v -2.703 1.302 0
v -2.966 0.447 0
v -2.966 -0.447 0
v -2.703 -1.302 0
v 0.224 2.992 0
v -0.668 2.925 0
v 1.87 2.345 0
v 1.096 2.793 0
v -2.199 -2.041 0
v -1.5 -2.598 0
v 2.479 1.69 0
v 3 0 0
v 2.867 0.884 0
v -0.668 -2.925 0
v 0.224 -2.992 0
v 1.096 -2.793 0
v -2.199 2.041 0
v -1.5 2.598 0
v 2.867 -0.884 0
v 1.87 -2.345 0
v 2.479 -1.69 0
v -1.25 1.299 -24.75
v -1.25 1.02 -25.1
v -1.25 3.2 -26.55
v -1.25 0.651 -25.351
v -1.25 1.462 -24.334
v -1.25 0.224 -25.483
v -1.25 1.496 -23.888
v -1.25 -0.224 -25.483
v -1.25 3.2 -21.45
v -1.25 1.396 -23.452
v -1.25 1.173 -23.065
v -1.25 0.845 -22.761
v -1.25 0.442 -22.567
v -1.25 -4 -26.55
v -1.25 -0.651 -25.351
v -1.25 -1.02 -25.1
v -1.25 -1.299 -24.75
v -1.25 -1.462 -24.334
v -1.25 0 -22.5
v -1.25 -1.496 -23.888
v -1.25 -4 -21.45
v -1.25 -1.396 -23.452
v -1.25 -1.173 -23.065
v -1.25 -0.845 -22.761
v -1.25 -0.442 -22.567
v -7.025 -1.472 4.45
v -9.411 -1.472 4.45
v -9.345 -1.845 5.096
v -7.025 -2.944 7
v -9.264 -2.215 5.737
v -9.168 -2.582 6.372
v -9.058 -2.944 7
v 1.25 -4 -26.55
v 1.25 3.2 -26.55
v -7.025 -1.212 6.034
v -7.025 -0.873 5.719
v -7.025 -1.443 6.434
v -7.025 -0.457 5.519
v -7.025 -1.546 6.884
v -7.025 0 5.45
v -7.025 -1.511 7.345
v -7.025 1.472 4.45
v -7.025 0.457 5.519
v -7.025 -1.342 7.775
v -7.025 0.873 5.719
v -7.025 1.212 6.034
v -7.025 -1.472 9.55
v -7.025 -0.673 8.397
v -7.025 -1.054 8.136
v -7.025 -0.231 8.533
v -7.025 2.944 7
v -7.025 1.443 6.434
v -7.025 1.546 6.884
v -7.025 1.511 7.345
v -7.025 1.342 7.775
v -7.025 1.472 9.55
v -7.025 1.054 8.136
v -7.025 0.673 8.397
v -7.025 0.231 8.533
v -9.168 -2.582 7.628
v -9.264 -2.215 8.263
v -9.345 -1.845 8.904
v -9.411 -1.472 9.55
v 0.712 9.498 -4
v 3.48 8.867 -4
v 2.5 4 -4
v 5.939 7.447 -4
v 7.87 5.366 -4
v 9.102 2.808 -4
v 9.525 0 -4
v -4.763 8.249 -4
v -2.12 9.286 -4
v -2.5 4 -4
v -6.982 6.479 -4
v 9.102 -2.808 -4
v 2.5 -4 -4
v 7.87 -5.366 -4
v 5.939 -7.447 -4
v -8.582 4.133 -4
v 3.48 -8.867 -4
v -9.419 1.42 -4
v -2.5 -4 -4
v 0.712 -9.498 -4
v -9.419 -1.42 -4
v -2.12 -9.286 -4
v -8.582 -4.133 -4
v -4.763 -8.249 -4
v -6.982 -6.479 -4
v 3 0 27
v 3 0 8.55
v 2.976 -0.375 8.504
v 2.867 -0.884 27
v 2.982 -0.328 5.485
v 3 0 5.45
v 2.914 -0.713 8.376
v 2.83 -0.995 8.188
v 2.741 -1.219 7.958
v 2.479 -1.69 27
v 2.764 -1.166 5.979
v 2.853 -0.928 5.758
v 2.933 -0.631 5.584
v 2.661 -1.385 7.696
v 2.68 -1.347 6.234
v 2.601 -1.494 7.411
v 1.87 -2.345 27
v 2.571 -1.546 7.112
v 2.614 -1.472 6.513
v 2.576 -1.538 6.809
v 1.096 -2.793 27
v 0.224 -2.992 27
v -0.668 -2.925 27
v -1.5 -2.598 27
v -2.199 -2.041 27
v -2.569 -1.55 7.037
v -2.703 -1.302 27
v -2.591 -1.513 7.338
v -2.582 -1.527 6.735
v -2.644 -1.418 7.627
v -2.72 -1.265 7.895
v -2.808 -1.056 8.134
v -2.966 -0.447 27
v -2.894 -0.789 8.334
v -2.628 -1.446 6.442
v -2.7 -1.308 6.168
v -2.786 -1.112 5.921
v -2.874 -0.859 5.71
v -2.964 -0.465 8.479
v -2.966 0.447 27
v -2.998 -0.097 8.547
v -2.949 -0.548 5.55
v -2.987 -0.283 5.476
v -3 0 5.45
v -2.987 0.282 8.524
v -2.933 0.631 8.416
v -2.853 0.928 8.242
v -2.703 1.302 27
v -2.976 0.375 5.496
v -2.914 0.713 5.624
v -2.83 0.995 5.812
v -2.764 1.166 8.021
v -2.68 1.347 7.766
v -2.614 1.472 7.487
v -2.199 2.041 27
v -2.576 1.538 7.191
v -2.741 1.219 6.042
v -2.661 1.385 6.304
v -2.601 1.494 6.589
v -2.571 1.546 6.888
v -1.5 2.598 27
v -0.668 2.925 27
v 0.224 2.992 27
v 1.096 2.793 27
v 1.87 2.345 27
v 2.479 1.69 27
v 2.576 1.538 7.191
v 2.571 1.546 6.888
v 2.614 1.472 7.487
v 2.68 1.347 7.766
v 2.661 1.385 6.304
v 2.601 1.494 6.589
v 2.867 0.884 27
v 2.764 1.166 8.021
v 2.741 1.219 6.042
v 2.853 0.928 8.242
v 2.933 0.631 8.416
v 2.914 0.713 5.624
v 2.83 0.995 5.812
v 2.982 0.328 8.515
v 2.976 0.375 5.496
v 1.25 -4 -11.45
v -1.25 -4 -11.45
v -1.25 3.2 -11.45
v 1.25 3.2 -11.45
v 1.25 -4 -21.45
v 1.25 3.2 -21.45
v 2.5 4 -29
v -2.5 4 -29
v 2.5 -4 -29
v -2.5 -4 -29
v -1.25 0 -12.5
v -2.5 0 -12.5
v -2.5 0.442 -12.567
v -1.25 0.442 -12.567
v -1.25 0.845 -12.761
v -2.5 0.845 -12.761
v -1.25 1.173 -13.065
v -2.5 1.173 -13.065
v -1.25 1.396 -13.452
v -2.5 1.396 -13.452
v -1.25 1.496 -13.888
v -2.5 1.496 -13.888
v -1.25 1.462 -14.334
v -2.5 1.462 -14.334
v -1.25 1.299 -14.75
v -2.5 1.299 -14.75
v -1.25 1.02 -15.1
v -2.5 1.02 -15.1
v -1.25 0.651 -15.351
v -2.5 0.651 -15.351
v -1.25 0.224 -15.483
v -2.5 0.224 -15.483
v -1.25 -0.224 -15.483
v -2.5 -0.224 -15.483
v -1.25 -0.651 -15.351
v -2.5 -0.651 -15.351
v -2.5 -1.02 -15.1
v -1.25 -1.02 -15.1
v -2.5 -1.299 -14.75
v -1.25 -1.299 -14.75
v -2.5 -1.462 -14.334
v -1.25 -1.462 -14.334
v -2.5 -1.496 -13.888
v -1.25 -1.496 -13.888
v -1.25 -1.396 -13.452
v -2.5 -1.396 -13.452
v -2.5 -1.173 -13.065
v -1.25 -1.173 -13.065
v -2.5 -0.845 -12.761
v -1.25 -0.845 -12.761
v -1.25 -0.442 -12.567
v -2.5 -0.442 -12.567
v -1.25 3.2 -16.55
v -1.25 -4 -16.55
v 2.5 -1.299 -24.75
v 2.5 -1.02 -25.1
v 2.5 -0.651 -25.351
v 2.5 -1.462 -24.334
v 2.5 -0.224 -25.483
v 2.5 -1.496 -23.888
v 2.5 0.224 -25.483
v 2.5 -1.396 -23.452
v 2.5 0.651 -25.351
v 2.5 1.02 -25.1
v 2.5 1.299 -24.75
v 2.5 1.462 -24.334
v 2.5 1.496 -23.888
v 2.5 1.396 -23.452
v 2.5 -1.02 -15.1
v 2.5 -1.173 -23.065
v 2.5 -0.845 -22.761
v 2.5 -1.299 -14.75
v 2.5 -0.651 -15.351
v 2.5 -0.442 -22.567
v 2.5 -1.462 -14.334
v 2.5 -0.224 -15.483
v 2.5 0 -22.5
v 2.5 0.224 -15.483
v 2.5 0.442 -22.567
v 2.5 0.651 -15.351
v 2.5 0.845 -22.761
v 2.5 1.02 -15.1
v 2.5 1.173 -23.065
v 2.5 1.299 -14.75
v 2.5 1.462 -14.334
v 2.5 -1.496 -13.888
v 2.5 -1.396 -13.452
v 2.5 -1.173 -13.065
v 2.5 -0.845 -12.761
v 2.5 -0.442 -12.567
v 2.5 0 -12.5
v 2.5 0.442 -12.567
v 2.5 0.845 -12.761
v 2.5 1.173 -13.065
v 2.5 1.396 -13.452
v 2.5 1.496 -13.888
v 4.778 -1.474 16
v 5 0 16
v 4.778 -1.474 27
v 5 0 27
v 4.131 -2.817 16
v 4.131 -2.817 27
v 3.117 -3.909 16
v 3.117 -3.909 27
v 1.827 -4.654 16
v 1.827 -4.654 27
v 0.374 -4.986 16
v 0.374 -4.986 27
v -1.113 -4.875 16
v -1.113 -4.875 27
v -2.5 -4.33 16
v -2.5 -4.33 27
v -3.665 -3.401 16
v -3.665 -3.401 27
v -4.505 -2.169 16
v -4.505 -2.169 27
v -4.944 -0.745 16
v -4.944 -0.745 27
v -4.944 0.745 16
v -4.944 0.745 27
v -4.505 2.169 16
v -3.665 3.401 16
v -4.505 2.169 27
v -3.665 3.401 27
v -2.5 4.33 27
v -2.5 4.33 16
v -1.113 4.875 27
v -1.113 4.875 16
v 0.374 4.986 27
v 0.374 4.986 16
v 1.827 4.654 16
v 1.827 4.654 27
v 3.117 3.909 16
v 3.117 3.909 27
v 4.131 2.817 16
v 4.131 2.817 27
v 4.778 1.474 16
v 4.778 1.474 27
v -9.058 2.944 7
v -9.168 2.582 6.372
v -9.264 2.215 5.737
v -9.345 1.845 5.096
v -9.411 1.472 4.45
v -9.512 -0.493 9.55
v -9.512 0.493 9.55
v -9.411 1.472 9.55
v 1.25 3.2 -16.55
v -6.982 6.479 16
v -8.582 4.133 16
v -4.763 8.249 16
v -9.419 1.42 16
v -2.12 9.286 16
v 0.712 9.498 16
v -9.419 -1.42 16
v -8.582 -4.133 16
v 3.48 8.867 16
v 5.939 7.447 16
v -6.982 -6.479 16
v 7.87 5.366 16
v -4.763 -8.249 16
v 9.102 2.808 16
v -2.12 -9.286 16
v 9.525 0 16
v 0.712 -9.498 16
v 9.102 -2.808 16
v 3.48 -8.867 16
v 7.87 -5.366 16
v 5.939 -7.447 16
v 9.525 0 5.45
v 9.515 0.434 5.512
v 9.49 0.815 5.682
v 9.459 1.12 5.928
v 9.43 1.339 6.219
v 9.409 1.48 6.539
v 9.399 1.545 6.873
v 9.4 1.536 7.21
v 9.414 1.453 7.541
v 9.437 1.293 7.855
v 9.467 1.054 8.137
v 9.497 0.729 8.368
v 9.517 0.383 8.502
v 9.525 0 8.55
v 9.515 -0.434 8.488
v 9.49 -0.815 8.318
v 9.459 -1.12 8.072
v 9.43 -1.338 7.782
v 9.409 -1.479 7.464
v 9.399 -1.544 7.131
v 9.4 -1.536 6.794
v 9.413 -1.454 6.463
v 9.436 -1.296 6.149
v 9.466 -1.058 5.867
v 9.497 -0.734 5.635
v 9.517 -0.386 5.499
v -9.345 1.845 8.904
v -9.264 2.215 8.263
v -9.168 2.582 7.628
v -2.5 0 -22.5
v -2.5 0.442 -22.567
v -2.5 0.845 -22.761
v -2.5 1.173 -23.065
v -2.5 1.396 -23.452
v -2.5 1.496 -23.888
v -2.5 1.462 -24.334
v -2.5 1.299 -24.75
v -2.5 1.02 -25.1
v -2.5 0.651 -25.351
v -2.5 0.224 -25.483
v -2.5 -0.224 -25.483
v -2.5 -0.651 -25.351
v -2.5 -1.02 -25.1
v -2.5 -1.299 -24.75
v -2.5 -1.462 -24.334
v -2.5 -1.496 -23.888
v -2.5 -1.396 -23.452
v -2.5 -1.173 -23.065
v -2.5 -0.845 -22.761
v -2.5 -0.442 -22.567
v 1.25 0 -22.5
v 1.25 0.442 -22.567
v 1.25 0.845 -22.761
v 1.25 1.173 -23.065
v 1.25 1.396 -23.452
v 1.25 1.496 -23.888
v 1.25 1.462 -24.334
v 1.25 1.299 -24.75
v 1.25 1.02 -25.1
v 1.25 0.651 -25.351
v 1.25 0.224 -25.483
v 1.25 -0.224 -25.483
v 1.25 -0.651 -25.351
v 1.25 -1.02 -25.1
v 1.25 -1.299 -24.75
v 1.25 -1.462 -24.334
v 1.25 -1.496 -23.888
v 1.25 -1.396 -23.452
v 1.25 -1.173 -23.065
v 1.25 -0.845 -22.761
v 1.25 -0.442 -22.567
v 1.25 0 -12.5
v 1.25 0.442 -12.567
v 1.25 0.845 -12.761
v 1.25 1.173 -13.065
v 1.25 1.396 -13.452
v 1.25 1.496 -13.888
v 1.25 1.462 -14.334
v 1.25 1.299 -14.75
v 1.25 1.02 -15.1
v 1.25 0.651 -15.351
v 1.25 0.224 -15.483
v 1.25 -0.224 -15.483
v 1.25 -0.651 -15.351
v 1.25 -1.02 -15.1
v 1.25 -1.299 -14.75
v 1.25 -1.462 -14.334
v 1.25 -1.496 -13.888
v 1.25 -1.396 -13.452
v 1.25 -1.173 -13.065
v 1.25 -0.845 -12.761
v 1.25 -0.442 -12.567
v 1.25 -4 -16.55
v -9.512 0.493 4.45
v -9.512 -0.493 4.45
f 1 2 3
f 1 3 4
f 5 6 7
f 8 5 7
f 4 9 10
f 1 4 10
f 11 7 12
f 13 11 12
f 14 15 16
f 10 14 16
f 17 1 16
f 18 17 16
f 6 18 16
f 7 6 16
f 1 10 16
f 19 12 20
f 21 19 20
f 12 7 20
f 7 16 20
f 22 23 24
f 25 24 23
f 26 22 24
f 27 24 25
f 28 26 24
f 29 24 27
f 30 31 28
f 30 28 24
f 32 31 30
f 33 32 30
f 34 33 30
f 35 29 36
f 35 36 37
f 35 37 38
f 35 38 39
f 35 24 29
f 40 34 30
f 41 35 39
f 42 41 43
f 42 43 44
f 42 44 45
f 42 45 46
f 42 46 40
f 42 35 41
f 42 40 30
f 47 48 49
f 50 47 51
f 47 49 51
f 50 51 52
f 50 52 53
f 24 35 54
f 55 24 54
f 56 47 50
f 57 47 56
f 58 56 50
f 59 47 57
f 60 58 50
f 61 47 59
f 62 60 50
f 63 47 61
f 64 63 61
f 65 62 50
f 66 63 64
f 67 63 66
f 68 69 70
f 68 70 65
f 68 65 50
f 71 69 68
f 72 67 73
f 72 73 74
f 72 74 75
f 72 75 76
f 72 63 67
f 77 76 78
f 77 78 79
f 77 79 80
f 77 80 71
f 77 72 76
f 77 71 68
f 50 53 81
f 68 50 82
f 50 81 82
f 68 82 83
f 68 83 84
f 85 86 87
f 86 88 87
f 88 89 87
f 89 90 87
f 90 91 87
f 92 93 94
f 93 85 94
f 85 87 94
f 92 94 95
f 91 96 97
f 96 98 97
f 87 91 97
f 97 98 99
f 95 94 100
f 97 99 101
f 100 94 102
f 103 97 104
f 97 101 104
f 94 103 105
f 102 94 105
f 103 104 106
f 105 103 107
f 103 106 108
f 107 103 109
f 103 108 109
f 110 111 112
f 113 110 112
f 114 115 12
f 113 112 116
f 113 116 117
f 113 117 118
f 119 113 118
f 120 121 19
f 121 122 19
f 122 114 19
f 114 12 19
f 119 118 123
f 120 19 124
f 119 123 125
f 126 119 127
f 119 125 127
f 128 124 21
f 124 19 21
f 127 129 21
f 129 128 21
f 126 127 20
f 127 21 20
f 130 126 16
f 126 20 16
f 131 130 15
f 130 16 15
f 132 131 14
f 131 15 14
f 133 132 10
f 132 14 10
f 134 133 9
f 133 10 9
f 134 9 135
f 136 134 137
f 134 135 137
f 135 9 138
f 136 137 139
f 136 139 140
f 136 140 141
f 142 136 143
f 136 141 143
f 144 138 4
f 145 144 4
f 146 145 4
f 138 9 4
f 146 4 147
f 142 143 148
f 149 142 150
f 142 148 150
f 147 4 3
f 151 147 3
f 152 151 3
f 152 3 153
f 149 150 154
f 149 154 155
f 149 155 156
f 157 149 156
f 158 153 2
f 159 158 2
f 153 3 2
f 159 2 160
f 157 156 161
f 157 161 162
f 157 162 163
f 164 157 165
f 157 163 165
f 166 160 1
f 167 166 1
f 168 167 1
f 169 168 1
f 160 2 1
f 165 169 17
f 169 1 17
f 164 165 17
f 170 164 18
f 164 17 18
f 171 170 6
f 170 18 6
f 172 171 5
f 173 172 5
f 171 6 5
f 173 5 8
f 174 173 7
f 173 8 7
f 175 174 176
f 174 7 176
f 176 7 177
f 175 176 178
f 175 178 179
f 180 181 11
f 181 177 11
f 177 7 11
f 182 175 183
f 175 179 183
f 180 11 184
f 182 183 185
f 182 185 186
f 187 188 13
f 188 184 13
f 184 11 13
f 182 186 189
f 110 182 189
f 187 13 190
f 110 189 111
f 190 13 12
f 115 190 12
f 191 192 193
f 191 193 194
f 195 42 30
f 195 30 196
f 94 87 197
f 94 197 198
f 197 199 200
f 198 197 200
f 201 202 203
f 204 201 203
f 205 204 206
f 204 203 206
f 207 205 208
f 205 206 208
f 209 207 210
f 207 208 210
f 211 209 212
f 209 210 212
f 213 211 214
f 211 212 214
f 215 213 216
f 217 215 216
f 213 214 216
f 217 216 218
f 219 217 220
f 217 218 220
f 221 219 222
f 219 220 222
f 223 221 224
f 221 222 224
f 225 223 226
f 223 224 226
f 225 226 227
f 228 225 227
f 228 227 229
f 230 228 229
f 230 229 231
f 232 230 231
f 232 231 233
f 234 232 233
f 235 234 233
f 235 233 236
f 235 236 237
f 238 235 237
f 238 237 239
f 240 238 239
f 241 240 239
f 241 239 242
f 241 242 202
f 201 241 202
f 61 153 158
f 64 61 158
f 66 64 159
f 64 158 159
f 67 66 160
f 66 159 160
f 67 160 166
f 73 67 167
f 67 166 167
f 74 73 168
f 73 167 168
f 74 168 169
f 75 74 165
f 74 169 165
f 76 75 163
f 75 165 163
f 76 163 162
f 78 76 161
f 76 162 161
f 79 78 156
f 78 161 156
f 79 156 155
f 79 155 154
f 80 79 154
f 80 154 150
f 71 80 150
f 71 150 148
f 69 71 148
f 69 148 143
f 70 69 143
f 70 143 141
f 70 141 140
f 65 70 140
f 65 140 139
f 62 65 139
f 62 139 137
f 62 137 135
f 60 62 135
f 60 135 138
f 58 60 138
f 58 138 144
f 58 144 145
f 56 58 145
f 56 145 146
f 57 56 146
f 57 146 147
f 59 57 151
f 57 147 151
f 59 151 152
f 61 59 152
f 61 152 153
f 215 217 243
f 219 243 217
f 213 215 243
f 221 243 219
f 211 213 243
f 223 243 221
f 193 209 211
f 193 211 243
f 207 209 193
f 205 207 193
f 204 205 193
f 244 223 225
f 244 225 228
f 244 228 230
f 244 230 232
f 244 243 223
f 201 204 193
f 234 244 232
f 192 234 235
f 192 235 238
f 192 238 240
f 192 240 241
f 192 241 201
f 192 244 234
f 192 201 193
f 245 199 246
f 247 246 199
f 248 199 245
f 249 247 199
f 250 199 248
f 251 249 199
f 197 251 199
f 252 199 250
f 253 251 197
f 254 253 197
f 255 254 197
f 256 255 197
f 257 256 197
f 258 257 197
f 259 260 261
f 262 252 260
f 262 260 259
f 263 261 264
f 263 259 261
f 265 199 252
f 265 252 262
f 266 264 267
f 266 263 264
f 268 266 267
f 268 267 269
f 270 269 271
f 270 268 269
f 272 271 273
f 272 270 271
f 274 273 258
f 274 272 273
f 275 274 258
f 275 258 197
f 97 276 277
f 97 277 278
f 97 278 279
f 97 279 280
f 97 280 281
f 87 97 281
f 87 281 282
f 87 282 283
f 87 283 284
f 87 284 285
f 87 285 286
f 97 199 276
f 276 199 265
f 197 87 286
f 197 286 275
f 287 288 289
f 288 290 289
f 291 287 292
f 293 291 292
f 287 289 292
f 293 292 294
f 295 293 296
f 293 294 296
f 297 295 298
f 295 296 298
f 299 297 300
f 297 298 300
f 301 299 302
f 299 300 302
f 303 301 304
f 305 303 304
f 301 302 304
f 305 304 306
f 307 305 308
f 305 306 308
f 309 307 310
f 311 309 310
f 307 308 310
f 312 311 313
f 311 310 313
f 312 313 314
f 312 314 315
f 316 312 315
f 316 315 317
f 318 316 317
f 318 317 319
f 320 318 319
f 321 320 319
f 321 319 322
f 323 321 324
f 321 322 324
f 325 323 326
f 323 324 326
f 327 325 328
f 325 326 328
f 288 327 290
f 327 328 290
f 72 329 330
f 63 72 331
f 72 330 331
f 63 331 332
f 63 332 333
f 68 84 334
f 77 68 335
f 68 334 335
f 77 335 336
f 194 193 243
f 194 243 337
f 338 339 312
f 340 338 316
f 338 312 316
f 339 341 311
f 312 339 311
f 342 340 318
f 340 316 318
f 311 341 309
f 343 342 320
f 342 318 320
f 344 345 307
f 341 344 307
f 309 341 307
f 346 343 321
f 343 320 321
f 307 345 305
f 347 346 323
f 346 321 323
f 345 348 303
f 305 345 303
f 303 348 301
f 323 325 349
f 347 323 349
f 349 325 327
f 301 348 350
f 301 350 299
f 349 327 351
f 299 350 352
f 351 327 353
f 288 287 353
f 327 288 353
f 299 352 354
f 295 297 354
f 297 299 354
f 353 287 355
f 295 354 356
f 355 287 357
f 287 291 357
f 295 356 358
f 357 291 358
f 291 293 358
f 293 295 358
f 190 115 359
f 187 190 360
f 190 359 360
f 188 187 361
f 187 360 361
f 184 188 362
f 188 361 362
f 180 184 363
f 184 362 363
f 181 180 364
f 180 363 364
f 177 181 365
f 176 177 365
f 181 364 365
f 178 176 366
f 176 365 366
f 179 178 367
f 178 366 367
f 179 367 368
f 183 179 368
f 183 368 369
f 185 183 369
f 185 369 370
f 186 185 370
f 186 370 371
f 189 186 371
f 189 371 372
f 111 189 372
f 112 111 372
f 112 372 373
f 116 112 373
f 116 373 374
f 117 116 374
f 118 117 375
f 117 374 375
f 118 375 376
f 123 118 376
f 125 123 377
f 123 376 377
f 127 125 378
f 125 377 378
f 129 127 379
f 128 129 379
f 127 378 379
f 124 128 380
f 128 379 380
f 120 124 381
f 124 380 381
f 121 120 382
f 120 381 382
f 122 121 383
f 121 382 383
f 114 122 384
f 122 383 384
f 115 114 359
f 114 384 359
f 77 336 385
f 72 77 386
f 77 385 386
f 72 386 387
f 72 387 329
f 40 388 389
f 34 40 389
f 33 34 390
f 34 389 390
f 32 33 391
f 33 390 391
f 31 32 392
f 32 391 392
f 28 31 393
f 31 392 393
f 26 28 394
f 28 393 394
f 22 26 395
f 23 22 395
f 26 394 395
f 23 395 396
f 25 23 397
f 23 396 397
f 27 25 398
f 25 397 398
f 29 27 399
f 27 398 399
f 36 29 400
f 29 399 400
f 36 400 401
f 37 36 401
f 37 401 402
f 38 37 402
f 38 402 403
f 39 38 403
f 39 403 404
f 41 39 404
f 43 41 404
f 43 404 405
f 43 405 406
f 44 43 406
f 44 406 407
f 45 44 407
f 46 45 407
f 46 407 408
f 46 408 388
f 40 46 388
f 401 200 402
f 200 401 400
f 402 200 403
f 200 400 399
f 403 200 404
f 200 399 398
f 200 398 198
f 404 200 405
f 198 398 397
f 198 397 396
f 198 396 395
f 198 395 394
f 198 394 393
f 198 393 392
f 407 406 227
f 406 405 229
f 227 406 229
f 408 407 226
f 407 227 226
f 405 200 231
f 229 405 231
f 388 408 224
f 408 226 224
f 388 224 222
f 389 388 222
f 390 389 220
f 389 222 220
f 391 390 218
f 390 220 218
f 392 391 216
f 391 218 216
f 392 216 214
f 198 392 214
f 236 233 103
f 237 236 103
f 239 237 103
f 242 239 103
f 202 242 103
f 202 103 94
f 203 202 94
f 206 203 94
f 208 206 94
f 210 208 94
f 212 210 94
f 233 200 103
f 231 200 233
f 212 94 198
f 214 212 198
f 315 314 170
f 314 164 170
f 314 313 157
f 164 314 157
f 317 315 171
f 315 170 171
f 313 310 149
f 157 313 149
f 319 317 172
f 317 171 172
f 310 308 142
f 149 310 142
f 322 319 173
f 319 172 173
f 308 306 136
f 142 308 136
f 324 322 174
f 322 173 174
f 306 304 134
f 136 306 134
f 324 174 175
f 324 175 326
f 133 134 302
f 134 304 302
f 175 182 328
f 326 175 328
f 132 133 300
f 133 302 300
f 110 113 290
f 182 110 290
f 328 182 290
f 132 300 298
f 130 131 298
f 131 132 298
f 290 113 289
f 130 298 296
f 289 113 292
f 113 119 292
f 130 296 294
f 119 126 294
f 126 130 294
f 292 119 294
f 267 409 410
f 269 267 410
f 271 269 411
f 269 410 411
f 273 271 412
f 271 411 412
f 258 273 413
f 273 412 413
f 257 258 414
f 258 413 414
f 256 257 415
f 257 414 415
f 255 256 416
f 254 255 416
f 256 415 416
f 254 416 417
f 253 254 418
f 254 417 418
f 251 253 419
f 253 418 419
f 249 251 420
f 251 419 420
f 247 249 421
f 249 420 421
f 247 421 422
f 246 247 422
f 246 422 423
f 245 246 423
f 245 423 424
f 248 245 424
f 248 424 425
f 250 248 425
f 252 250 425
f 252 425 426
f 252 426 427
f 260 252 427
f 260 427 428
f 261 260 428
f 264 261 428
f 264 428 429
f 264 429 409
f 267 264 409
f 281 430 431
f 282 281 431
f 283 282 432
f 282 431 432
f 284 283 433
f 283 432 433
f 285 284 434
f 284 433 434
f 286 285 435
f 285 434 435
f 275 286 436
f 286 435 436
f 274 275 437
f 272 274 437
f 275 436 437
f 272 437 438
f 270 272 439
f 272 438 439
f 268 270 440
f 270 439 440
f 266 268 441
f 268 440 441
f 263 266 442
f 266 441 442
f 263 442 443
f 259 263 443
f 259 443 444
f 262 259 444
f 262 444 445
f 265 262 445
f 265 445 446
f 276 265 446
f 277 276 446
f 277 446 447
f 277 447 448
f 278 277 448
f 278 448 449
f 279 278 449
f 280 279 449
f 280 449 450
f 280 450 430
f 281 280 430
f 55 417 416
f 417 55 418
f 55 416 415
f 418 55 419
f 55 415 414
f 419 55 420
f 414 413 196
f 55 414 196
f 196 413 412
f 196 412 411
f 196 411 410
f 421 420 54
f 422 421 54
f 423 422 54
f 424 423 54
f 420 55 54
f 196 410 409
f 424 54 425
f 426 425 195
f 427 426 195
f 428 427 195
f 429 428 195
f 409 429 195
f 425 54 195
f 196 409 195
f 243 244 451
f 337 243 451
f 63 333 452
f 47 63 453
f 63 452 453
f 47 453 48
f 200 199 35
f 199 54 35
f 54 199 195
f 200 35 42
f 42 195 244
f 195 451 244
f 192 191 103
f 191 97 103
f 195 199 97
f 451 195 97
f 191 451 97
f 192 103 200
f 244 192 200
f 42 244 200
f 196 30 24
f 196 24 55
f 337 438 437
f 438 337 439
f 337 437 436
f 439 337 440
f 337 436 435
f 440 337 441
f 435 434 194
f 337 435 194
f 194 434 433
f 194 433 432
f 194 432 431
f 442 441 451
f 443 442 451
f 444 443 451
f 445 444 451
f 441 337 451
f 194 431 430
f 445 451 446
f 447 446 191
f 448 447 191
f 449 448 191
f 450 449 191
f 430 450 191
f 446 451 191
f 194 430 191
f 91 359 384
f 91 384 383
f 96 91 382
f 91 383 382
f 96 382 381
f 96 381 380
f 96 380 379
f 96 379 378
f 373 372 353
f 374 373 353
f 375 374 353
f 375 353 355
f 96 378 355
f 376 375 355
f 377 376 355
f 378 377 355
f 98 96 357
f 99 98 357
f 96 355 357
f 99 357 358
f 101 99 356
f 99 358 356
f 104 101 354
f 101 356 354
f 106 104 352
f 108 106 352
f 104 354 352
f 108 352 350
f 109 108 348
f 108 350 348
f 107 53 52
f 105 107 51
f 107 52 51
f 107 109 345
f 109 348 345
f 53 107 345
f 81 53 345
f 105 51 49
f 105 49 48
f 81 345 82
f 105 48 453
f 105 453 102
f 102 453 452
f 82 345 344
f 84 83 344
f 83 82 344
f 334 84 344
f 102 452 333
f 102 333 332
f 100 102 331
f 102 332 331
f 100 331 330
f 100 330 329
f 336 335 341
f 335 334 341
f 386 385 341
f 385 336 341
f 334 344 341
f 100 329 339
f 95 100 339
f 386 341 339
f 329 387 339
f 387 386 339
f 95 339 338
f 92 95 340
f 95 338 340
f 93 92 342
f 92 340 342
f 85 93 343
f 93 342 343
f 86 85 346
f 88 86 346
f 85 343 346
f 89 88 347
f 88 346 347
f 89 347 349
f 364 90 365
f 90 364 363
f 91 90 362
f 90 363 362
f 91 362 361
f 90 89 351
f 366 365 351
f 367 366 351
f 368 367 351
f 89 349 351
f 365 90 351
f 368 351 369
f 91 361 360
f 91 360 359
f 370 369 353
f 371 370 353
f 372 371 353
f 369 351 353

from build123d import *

# Parameters (mm, degrees)
SKETCH2_W                  = 5
SKETCH2_H                  = 8
BOSS_EXTRUDE1_DEPTH        = 25
M2_5_CLEARANCE_HOLE1_D     = 3
M2_5_CLEARANCE_HOLE1_DEPTH = 9.098709071
M2_5_CLEARANCE_HOLE1_TIP   = 0.901290929
SKETCH5_W                  = 2.5
SKETCH5_H                  = 5.1
CUT_EXTRUDE1_DEPTH         = 7.2
M2_5_CLEARANCE_HOLE2_D     = 3.1
SKETCH7_2_R                = 0.5
CUT_EXTRUDE2_DEPTH         = 2.5


with BuildPart() as part:
    # Sketch1 → Revolve1 (revolve)
    with BuildSketch(Plane(origin=(0, 0, 0), x_dir=(1, 0, 0), z_dir=(0, 1, 0)), mode=Mode.PRIVATE) as revolve1_sk:
        Polygon((0, 4), (-5, 4), (-9.525, 4), (-9.525, -16), (-5, -16), (-5, -27), (-3, -27), (-3, 0), (0, 0), align=None)
    revolve(revolve1_sk.sketch.rotate(Axis((0, 0, 0), (0, 0, -1)), 180), axis=Axis((0, 0, 0), (0, 0, -1)))

    # Sketch2 → Boss-Extrude1 (add)
    with BuildSketch(Plane(origin=(0, 0, -4), x_dir=(-1, 0, 0), z_dir=(0, 0, -1))):
        Rectangle(SKETCH2_W, SKETCH2_H)
    extrude(amount=BOSS_EXTRUDE1_DEPTH)

    # M2.5 Clearance Hole1
    with Locations(Plane(origin=(2.5, 0, 0), x_dir=(0, 0, -1), z_dir=(1, 0, 0))):
        with Locations((24, 0), (14, 0)):
            Hole(M2_5_CLEARANCE_HOLE1_D / 2, depth=M2_5_CLEARANCE_HOLE1_DEPTH)
            with Locations((0, 0, -(M2_5_CLEARANCE_HOLE1_DEPTH + M2_5_CLEARANCE_HOLE1_TIP / 2))):  # 118° drill point
                Cone(0, M2_5_CLEARANCE_HOLE1_D / 2, M2_5_CLEARANCE_HOLE1_TIP, mode=Mode.SUBTRACT)

    # Sketch5 → Cut-Extrude1 (cut)
    with BuildSketch(Plane.XZ.offset(4)):
        with Locations((0, -14)):
            Rectangle(SKETCH5_W, SKETCH5_H)
        with Locations((0, -24)):
            Rectangle(SKETCH5_W, SKETCH5_H)
    extrude(amount=-CUT_EXTRUDE1_DEPTH, mode=Mode.SUBTRACT)

    # M2.5 Clearance Hole2 (through all)
    with Locations(Plane.ZY.offset(9.525)):
        with Locations((7, 0)):
            Hole(M2_5_CLEARANCE_HOLE2_D / 2)

    # Sketch7<2> → Cut-Extrude2 (cut)
    with BuildSketch(Plane.ZY.offset(9.525)):
        Polygon((7, -2.944486373), (9.55, -1.472243186), (9.55, 1.472243186), (7, 2.944486373), (4.45, 1.472243186), (4.45, -1.472243186), align=None)
        with Locations((7, 0)):
            Circle(SKETCH7_2_R, mode=Mode.SUBTRACT)
    extrude(amount=-CUT_EXTRUDE2_DEPTH, mode=Mode.SUBTRACT)


solid = part.part
